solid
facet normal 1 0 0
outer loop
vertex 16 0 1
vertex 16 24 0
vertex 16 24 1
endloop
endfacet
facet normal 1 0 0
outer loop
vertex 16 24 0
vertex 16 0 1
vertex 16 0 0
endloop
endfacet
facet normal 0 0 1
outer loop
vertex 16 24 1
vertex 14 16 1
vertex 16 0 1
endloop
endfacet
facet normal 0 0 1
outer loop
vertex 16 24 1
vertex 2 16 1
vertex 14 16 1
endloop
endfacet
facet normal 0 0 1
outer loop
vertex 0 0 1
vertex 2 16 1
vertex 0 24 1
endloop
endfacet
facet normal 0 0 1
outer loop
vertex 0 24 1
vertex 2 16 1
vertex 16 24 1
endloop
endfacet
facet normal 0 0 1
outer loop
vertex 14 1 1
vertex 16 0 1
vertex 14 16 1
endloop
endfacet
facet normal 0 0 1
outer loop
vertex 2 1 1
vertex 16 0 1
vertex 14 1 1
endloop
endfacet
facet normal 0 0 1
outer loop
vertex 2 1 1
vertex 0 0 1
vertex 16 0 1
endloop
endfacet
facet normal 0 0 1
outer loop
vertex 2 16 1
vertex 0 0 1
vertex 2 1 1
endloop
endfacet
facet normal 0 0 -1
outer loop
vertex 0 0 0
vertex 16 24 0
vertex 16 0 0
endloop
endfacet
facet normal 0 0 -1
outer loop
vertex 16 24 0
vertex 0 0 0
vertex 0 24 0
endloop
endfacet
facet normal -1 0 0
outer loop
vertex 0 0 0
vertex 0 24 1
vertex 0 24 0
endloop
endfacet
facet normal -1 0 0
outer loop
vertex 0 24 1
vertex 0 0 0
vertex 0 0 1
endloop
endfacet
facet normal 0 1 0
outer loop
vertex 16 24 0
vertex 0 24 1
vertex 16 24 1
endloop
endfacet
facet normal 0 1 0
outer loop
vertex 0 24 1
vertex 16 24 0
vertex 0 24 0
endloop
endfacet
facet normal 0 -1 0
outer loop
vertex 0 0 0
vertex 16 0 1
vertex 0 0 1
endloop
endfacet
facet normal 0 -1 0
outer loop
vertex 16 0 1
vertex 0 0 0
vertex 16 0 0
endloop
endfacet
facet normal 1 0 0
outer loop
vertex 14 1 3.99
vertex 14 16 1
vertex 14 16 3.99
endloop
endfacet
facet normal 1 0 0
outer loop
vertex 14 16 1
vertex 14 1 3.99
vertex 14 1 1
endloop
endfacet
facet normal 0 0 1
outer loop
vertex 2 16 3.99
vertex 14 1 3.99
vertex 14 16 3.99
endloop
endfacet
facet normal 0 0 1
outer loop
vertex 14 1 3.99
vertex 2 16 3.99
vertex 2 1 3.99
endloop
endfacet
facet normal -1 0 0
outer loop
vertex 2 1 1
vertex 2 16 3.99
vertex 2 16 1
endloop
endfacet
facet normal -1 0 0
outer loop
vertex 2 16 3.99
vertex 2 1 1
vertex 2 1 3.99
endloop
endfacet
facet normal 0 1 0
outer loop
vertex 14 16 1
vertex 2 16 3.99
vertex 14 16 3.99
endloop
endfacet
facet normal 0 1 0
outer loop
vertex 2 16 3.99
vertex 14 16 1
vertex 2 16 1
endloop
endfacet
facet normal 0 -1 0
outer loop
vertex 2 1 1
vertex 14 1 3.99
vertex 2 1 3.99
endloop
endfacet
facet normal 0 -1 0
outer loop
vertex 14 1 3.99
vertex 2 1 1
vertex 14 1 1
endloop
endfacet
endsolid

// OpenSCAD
// file: ../electronics/config.scad
// Rendering: Level of detail
$fn = 80;

// Quickfix for rendering artifacts on overlapping surfaces
nothing = 0.01;

/*
 * Globally relevant model parameters
 */
adapter_pcb_size_x = 26;
adapter_pcb_size_y = 29;
adapter_pcb_size_z = 1.0;
adapter_pin_spacing = 2.54;

sensor_pcb_size_x = 20;
sensor_pcb_size_y = 20;
sensor_pcb_size_z = 1.0;

led_socket_pin_spacing = 2.54;
led_socket_pin_count = 4;
led_socket_size_x = led_socket_pin_count * led_socket_pin_spacing;
led_diameter = 5.0;
// main file
include <../electronics/config.scad>;


/**
 * PCB with Espressif ESP8266 Wifi MCU and onboard antenna
 */
module esp8266mod(
            // PCB outline
            pcb_color = "black",
            pcb_size_x = 16.0,
            pcb_size_y = 24.0,
            pcb_size_z = 1.0,

            // MCU shield outline
            shield_color = "lightgray",
            shield_size_x = 12,
            shield_size_y = 15,
            shield_size_z = 3,
            shield_inset_x = 2,
            shield_inset_y = 1
        )
{
    // Board
    color(pcb_color)
    cube([pcb_size_x, pcb_size_y, pcb_size_z]);

    // MCU shield
    color(shield_color)
    translate([shield_inset_x, shield_inset_y, pcb_size_z-nothing])
    cube([shield_size_x, shield_size_y, shield_size_z]);
}

esp8266mod();
